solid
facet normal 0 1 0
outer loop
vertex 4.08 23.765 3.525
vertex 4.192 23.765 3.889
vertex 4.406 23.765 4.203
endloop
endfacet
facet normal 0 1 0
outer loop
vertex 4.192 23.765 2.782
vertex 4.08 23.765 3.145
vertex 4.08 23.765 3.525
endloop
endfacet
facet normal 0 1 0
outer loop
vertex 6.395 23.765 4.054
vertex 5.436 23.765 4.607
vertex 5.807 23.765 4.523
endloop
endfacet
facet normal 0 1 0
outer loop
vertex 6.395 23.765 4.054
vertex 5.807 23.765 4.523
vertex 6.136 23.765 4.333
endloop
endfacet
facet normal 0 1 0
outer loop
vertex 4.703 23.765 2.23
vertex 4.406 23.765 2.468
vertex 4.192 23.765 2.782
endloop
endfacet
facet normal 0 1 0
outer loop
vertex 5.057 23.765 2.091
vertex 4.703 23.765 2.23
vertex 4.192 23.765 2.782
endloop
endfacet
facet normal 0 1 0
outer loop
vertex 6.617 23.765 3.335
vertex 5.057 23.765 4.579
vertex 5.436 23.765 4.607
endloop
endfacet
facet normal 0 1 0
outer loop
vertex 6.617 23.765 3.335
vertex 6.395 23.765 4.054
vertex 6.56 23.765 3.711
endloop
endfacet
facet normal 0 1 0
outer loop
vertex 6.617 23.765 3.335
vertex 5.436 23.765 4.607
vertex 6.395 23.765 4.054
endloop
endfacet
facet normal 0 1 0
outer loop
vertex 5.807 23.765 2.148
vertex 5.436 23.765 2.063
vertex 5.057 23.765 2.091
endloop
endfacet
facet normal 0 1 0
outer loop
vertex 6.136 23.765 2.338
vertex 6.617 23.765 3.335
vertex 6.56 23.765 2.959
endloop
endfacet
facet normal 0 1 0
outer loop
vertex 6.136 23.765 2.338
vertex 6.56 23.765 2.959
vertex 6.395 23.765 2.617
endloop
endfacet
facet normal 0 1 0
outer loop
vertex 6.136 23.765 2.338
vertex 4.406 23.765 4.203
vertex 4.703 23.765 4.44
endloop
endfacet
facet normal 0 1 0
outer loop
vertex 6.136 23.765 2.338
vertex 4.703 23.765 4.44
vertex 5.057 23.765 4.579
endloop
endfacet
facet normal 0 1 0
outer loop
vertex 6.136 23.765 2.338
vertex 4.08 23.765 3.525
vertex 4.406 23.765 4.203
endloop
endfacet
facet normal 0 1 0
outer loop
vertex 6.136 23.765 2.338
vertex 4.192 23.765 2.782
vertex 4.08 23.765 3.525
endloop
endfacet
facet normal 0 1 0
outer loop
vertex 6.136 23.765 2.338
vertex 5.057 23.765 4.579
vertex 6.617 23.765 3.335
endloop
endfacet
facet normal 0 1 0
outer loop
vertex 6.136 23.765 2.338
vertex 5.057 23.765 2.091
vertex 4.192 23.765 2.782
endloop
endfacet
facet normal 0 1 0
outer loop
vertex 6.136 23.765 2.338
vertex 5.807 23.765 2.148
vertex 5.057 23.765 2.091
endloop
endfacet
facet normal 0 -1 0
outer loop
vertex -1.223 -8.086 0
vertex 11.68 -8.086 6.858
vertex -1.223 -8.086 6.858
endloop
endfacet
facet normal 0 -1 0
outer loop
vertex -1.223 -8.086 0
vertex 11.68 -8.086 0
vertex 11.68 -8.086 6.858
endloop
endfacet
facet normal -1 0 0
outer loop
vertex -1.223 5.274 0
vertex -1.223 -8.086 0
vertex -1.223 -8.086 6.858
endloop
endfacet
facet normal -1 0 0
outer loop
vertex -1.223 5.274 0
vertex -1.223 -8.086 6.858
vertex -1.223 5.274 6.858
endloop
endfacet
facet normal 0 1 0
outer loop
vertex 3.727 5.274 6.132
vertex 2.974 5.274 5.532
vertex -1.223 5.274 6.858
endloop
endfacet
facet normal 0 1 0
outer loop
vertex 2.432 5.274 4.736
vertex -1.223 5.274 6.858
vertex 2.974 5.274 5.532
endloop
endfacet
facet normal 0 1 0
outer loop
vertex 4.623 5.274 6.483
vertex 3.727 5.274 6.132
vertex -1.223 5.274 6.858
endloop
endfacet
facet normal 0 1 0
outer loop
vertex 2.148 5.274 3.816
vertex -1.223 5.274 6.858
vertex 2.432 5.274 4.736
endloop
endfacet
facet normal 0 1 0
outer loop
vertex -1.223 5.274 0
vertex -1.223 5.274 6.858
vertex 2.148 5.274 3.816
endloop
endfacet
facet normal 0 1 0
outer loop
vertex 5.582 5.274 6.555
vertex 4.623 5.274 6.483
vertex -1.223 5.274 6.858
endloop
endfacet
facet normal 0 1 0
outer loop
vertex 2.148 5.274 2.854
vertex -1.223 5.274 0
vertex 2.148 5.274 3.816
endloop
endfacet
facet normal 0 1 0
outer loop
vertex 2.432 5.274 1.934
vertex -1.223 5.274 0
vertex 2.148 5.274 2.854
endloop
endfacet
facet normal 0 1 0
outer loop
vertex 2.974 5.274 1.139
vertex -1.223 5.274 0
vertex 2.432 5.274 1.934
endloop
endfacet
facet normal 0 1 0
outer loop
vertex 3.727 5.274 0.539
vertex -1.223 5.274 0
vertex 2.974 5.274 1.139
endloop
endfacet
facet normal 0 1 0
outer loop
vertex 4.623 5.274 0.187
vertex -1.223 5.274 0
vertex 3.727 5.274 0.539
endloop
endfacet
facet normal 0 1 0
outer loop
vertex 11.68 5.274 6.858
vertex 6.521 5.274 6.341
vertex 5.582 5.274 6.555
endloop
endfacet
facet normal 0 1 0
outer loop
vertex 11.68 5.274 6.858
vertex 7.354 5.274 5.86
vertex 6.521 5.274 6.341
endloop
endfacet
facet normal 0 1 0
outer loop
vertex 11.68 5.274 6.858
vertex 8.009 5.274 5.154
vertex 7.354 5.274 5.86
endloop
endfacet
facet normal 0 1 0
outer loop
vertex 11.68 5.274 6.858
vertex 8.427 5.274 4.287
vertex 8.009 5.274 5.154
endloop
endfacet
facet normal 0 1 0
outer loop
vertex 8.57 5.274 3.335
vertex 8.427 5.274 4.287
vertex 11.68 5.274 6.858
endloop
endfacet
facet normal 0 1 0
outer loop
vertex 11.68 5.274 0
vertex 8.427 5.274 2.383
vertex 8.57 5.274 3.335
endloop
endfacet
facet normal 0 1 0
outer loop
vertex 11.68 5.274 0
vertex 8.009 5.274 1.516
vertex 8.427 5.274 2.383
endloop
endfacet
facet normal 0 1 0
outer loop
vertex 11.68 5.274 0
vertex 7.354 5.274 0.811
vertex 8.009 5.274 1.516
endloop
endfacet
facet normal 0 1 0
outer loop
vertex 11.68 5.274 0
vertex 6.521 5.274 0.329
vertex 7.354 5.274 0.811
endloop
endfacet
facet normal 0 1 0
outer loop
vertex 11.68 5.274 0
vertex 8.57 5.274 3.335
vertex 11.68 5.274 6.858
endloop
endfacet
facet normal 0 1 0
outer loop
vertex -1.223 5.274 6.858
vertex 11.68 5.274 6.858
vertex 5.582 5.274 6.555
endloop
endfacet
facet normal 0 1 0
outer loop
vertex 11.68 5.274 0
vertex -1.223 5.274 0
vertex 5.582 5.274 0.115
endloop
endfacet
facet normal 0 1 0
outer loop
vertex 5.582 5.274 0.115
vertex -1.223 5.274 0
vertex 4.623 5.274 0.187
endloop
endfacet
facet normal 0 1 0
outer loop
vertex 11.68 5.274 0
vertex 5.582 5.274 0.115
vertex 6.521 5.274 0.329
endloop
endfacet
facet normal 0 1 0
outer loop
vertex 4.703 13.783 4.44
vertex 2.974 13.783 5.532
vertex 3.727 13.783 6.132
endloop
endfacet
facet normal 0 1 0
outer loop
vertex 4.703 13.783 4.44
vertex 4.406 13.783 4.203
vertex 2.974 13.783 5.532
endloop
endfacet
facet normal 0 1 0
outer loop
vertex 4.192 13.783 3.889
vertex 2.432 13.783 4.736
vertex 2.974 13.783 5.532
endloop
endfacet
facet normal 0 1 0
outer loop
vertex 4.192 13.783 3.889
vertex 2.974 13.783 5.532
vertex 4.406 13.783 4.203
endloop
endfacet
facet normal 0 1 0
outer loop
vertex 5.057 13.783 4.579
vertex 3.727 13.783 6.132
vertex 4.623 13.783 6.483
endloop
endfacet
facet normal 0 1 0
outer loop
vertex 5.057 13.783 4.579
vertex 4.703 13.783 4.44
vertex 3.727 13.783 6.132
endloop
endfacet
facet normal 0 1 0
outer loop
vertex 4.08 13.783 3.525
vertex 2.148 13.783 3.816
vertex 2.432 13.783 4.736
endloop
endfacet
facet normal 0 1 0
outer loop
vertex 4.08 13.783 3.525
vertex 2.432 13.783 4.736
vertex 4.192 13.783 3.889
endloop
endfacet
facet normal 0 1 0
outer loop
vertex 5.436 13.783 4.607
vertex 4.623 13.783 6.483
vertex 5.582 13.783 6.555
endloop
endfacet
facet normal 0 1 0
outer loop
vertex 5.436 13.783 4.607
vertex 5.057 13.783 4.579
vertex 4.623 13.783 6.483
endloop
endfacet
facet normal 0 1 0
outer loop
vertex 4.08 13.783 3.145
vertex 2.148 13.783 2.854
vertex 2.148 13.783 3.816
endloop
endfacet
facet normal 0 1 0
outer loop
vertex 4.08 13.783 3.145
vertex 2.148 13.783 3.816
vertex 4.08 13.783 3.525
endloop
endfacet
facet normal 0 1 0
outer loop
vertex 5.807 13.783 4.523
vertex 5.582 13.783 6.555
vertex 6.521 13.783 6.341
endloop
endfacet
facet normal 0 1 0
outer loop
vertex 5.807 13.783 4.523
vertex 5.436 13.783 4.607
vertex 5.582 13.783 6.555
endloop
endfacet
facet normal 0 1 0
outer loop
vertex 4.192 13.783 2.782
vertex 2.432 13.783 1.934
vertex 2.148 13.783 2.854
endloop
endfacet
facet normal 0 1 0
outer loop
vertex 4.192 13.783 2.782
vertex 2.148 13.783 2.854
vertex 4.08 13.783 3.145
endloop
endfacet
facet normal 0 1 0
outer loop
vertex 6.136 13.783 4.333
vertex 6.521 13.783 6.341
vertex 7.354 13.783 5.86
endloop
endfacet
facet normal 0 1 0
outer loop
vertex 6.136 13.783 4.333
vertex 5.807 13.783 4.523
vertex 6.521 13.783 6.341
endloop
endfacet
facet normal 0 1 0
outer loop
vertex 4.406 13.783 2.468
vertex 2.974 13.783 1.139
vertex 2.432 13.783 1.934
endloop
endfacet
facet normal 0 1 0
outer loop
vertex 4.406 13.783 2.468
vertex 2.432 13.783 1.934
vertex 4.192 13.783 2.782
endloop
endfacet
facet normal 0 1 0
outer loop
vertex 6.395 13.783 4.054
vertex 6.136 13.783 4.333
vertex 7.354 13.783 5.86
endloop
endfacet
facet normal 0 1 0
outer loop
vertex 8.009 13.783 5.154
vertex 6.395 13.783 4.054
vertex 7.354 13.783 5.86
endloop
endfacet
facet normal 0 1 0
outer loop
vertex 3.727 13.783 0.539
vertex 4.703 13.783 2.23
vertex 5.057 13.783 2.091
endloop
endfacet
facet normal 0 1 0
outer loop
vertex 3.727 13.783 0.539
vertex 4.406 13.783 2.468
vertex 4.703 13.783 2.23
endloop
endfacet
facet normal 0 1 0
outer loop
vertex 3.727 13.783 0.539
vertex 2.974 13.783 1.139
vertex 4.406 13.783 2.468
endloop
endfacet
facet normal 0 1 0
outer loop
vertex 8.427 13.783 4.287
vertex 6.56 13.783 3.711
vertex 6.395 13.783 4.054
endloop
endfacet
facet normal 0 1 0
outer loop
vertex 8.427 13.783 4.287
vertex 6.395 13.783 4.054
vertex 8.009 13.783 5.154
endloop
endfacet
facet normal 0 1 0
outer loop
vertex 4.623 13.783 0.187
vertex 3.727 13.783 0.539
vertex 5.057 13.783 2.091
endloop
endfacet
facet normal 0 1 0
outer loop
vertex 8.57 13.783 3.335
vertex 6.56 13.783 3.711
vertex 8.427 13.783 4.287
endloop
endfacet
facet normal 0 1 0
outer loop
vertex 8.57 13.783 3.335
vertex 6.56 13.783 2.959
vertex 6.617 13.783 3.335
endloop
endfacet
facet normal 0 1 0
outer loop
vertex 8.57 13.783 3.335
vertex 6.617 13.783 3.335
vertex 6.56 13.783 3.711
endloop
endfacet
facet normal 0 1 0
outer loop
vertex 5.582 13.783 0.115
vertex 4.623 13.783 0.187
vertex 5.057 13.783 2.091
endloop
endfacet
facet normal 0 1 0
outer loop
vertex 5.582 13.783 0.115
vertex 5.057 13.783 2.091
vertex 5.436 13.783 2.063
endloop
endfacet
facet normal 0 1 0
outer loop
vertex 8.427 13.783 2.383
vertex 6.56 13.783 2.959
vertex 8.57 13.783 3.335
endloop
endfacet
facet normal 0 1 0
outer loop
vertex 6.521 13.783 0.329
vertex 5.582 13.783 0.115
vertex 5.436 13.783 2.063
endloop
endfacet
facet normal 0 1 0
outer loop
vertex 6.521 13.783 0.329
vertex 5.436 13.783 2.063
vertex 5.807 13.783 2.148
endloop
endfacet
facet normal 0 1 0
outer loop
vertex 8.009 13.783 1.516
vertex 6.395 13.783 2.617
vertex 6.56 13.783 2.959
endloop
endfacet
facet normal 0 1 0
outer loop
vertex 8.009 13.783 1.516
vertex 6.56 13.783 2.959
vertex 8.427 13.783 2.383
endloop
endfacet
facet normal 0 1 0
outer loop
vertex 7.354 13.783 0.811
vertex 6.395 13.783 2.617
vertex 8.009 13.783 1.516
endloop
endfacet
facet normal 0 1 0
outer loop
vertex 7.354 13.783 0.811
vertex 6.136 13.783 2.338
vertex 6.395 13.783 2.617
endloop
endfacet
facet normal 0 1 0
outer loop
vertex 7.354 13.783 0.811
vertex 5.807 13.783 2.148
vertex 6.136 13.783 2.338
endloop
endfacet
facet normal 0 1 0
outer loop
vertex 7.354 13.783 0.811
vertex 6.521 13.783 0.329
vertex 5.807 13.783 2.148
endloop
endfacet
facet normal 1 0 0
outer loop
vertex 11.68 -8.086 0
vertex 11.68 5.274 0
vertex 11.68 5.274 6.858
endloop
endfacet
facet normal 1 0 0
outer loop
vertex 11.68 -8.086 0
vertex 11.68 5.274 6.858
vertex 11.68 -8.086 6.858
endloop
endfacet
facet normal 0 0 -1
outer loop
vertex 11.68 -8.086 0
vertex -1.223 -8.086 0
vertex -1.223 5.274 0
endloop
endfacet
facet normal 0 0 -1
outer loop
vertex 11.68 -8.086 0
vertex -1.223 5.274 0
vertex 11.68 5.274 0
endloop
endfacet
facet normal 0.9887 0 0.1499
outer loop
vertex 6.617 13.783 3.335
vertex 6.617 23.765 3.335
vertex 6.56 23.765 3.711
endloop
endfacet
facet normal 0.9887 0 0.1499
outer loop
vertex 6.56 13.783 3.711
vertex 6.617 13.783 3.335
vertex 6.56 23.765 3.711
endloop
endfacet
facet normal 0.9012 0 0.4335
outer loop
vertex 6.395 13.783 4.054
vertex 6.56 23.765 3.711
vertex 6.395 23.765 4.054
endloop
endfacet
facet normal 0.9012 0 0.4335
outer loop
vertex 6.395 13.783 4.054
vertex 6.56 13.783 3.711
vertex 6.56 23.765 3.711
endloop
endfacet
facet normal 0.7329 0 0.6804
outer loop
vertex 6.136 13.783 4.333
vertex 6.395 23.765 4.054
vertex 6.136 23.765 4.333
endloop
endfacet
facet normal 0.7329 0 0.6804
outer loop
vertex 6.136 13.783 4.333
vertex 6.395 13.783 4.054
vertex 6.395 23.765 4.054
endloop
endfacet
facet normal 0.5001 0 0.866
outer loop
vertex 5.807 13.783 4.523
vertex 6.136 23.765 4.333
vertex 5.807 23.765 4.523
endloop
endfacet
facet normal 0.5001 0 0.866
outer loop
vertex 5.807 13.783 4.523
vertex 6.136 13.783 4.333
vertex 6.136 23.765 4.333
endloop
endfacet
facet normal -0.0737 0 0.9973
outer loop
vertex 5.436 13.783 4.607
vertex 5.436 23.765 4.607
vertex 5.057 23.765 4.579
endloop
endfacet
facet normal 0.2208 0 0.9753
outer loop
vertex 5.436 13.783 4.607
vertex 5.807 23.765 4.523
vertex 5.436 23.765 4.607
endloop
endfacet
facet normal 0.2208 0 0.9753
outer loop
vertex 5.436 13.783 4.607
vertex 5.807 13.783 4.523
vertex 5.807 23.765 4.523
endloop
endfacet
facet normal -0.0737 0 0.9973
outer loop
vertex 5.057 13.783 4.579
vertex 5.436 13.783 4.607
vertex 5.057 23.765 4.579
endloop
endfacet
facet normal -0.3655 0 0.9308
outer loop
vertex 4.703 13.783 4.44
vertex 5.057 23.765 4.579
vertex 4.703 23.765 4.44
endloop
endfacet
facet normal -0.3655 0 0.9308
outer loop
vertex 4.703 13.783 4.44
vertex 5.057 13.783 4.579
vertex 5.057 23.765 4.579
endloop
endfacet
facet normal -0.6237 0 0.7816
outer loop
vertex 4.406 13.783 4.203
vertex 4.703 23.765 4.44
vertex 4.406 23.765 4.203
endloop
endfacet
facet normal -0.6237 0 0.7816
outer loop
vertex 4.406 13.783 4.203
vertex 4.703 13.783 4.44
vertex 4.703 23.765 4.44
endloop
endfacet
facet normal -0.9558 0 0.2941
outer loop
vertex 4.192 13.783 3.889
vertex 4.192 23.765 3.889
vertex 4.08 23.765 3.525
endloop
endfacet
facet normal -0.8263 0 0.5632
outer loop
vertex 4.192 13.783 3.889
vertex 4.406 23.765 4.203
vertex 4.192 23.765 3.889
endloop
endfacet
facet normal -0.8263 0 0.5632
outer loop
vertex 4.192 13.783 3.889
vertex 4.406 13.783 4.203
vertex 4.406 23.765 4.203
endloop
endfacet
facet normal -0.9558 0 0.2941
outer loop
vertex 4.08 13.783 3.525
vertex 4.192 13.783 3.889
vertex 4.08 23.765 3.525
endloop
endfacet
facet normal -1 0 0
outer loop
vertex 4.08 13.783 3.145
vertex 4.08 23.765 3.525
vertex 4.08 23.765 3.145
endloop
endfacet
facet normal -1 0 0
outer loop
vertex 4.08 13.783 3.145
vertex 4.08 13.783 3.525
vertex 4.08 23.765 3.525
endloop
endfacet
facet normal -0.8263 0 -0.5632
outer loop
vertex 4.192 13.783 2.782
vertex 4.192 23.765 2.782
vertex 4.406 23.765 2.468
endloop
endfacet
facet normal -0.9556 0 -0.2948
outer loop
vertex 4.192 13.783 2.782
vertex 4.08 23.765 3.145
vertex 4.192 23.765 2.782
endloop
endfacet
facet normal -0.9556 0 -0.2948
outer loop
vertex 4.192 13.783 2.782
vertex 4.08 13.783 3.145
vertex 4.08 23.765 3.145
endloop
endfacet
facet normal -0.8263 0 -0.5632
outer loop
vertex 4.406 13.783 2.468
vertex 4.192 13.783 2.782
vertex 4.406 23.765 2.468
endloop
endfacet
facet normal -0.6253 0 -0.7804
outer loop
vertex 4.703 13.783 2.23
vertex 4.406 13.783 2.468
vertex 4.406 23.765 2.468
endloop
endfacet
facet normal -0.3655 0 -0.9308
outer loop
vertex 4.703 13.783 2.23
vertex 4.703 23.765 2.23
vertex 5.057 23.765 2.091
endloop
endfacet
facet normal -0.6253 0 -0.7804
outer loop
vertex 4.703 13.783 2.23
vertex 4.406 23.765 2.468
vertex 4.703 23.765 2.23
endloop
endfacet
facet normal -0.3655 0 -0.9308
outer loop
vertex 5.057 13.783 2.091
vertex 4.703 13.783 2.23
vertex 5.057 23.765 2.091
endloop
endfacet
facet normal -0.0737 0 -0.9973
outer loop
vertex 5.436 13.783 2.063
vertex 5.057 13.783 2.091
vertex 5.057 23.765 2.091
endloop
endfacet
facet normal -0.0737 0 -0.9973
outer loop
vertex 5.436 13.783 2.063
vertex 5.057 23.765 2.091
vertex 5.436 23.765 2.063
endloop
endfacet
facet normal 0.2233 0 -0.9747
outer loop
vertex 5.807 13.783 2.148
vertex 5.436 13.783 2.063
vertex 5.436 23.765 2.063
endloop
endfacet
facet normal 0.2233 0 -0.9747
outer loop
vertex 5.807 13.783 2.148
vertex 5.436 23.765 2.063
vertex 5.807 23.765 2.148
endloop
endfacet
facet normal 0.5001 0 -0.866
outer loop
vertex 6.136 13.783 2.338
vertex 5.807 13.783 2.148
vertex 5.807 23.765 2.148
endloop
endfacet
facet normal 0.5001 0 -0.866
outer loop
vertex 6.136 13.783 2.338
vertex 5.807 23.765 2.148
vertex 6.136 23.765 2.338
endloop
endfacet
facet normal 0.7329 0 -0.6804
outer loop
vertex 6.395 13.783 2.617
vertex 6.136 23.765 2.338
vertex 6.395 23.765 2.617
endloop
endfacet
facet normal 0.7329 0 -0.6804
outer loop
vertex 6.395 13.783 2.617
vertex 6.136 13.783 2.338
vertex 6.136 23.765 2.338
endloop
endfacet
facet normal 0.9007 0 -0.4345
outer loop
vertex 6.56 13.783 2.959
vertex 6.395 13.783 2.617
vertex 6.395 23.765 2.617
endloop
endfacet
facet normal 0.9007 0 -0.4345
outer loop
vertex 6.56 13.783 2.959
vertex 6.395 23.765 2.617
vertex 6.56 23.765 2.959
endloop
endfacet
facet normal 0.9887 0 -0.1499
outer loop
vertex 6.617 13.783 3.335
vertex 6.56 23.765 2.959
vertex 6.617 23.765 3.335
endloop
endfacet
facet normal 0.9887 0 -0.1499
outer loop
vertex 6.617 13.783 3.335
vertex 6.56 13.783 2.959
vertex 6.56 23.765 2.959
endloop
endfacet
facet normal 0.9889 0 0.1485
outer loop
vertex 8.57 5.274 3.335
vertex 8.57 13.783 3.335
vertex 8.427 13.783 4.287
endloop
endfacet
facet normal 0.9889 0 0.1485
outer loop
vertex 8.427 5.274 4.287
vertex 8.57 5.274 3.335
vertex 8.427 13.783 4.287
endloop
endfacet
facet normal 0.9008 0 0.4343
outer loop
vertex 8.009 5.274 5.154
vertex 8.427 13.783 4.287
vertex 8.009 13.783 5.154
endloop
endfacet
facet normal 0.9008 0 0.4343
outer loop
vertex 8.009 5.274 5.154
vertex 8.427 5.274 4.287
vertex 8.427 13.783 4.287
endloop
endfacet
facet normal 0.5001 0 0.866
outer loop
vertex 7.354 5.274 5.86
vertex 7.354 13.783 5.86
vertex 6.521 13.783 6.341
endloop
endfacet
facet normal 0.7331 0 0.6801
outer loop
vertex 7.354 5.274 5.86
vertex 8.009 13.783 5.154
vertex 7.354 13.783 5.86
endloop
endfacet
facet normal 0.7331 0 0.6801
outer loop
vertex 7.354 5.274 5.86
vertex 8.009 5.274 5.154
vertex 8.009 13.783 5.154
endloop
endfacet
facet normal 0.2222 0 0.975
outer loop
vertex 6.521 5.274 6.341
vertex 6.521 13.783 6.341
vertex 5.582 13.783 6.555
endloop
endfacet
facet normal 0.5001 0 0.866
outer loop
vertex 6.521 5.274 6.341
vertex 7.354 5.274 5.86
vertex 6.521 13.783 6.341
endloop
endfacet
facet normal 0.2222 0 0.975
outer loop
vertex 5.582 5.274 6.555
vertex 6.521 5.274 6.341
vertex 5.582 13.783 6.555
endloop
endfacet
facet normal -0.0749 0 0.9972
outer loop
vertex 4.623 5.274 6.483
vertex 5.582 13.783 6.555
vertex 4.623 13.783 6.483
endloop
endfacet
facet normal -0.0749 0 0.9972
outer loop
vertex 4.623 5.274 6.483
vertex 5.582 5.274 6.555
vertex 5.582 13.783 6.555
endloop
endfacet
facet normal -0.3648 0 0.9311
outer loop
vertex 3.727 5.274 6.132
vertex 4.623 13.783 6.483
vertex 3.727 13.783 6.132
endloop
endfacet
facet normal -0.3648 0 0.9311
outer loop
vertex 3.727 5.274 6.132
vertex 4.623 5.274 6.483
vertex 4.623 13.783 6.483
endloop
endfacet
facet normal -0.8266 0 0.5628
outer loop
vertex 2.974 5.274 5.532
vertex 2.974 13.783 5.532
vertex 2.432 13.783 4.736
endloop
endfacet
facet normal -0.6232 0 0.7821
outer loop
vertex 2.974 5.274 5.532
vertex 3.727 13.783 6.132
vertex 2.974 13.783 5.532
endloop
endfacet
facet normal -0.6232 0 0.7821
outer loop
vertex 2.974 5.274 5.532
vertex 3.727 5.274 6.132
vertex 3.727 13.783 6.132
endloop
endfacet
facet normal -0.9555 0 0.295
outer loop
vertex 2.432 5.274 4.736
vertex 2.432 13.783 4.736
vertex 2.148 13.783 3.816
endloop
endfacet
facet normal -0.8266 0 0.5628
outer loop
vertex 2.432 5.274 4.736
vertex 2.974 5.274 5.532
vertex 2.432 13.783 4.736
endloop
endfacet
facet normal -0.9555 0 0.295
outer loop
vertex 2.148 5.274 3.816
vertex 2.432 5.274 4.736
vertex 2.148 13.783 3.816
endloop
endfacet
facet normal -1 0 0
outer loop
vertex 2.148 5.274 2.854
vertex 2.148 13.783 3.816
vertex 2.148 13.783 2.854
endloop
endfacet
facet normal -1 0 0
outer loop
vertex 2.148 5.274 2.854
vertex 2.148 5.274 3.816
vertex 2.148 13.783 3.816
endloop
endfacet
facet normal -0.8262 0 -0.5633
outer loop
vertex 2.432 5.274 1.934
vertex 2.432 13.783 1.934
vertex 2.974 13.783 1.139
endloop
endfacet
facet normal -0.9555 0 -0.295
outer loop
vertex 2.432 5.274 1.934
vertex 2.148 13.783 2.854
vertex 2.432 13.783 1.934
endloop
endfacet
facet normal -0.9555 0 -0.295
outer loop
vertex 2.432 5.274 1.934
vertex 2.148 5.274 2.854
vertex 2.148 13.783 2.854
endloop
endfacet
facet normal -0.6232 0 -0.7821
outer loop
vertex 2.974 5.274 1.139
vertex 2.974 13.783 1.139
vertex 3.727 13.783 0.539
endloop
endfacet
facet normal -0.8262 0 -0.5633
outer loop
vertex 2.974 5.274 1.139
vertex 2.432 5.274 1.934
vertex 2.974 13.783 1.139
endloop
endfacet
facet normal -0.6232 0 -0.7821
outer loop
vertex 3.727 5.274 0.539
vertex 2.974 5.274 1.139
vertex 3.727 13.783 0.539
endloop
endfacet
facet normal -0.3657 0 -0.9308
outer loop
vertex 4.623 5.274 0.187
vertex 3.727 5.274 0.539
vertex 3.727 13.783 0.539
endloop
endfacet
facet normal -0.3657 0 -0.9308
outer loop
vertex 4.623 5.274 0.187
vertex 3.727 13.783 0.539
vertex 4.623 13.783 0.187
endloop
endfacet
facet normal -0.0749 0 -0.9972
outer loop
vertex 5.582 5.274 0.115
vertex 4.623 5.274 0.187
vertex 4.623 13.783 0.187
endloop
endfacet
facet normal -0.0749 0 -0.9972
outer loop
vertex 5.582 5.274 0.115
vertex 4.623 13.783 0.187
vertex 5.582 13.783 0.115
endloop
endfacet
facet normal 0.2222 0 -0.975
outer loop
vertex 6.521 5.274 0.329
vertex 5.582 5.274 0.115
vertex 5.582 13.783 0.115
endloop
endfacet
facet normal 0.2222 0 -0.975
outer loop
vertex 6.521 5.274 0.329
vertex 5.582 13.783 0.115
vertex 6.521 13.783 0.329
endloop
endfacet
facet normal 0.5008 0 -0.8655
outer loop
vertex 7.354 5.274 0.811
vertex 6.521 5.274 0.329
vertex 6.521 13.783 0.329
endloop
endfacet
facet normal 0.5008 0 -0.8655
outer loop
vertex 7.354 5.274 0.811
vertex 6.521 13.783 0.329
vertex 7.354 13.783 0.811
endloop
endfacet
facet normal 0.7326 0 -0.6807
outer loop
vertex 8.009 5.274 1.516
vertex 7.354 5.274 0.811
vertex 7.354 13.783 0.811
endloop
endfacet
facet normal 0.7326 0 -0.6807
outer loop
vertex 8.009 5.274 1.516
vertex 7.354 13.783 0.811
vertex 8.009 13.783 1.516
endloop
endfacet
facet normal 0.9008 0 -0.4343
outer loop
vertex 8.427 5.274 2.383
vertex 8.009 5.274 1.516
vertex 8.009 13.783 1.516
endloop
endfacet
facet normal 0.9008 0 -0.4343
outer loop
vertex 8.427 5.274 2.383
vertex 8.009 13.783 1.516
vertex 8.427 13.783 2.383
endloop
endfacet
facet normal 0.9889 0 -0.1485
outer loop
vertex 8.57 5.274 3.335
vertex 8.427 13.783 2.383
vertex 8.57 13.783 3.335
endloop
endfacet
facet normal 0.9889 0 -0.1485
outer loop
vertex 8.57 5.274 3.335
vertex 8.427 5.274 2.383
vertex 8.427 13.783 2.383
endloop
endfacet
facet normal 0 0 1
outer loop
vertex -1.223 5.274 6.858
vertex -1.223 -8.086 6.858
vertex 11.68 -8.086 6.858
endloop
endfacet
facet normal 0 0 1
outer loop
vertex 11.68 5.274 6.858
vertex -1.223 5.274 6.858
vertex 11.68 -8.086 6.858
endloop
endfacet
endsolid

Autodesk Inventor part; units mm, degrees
ref_plane "YZ Plane" through (0, 0, 0) normal (1, 0, 0) x (0, 1, 0)
ref_plane "XZ Plane" through (0, 0, 0) normal (0, 1, 0) x (-1, 0, 0)
ref_plane "XY Plane" through (0, 0, 0) normal (0, 0, 1) x (1, 0, 0)
sketch "Sketch1" plane through (0, 0, 0) normal (0, 0, 1) x (1, 0, 0)
  line L0 (-1.2233, 5.2741) -> (11.6799, 5.2741)
  line L1 (11.6799, 5.2741) -> (11.6799, -8.0863)
  line L2 (11.6799, -8.0863) -> (-1.2233, -8.0863)
  line L3 (-1.2233, -8.0863) -> (-1.2233, 5.2741)
  point P0 (0, 0)
  dimension "d0" = 12.9032
  dimension "d1" = 13.3604
extrude "Extrusion1" add sketch "Sketch1" along normal blind 6.858
sketch "Sketch2" plane through (-1.2233, 5.2741, 0) normal (0, 1, 0) x (1, 0, 0)
  circle A0 centre (6.5644, -3.3352) radius 3.2291
  line L0 (12.9032, 0) -> (12.9032, -6.858) projected
  point P0 (1.2233, 0)
  dimension "d4" = 6.3388
extrude "Extrusion2" add sketch "Sketch2" along normal blind 8.509
sketch "Sketch3" plane through (5.3411, 13.7831, 3.3352) normal (0, 1, 0) x (1, 0, 0)
  circle A0 centre (0, 0) radius 1.2757
  point P0 (-5.3411, 3.3352)
extrude "Extrusion3" add sketch "Sketch3" along normal blind 9.9822
properties part number "RTS Switch"
